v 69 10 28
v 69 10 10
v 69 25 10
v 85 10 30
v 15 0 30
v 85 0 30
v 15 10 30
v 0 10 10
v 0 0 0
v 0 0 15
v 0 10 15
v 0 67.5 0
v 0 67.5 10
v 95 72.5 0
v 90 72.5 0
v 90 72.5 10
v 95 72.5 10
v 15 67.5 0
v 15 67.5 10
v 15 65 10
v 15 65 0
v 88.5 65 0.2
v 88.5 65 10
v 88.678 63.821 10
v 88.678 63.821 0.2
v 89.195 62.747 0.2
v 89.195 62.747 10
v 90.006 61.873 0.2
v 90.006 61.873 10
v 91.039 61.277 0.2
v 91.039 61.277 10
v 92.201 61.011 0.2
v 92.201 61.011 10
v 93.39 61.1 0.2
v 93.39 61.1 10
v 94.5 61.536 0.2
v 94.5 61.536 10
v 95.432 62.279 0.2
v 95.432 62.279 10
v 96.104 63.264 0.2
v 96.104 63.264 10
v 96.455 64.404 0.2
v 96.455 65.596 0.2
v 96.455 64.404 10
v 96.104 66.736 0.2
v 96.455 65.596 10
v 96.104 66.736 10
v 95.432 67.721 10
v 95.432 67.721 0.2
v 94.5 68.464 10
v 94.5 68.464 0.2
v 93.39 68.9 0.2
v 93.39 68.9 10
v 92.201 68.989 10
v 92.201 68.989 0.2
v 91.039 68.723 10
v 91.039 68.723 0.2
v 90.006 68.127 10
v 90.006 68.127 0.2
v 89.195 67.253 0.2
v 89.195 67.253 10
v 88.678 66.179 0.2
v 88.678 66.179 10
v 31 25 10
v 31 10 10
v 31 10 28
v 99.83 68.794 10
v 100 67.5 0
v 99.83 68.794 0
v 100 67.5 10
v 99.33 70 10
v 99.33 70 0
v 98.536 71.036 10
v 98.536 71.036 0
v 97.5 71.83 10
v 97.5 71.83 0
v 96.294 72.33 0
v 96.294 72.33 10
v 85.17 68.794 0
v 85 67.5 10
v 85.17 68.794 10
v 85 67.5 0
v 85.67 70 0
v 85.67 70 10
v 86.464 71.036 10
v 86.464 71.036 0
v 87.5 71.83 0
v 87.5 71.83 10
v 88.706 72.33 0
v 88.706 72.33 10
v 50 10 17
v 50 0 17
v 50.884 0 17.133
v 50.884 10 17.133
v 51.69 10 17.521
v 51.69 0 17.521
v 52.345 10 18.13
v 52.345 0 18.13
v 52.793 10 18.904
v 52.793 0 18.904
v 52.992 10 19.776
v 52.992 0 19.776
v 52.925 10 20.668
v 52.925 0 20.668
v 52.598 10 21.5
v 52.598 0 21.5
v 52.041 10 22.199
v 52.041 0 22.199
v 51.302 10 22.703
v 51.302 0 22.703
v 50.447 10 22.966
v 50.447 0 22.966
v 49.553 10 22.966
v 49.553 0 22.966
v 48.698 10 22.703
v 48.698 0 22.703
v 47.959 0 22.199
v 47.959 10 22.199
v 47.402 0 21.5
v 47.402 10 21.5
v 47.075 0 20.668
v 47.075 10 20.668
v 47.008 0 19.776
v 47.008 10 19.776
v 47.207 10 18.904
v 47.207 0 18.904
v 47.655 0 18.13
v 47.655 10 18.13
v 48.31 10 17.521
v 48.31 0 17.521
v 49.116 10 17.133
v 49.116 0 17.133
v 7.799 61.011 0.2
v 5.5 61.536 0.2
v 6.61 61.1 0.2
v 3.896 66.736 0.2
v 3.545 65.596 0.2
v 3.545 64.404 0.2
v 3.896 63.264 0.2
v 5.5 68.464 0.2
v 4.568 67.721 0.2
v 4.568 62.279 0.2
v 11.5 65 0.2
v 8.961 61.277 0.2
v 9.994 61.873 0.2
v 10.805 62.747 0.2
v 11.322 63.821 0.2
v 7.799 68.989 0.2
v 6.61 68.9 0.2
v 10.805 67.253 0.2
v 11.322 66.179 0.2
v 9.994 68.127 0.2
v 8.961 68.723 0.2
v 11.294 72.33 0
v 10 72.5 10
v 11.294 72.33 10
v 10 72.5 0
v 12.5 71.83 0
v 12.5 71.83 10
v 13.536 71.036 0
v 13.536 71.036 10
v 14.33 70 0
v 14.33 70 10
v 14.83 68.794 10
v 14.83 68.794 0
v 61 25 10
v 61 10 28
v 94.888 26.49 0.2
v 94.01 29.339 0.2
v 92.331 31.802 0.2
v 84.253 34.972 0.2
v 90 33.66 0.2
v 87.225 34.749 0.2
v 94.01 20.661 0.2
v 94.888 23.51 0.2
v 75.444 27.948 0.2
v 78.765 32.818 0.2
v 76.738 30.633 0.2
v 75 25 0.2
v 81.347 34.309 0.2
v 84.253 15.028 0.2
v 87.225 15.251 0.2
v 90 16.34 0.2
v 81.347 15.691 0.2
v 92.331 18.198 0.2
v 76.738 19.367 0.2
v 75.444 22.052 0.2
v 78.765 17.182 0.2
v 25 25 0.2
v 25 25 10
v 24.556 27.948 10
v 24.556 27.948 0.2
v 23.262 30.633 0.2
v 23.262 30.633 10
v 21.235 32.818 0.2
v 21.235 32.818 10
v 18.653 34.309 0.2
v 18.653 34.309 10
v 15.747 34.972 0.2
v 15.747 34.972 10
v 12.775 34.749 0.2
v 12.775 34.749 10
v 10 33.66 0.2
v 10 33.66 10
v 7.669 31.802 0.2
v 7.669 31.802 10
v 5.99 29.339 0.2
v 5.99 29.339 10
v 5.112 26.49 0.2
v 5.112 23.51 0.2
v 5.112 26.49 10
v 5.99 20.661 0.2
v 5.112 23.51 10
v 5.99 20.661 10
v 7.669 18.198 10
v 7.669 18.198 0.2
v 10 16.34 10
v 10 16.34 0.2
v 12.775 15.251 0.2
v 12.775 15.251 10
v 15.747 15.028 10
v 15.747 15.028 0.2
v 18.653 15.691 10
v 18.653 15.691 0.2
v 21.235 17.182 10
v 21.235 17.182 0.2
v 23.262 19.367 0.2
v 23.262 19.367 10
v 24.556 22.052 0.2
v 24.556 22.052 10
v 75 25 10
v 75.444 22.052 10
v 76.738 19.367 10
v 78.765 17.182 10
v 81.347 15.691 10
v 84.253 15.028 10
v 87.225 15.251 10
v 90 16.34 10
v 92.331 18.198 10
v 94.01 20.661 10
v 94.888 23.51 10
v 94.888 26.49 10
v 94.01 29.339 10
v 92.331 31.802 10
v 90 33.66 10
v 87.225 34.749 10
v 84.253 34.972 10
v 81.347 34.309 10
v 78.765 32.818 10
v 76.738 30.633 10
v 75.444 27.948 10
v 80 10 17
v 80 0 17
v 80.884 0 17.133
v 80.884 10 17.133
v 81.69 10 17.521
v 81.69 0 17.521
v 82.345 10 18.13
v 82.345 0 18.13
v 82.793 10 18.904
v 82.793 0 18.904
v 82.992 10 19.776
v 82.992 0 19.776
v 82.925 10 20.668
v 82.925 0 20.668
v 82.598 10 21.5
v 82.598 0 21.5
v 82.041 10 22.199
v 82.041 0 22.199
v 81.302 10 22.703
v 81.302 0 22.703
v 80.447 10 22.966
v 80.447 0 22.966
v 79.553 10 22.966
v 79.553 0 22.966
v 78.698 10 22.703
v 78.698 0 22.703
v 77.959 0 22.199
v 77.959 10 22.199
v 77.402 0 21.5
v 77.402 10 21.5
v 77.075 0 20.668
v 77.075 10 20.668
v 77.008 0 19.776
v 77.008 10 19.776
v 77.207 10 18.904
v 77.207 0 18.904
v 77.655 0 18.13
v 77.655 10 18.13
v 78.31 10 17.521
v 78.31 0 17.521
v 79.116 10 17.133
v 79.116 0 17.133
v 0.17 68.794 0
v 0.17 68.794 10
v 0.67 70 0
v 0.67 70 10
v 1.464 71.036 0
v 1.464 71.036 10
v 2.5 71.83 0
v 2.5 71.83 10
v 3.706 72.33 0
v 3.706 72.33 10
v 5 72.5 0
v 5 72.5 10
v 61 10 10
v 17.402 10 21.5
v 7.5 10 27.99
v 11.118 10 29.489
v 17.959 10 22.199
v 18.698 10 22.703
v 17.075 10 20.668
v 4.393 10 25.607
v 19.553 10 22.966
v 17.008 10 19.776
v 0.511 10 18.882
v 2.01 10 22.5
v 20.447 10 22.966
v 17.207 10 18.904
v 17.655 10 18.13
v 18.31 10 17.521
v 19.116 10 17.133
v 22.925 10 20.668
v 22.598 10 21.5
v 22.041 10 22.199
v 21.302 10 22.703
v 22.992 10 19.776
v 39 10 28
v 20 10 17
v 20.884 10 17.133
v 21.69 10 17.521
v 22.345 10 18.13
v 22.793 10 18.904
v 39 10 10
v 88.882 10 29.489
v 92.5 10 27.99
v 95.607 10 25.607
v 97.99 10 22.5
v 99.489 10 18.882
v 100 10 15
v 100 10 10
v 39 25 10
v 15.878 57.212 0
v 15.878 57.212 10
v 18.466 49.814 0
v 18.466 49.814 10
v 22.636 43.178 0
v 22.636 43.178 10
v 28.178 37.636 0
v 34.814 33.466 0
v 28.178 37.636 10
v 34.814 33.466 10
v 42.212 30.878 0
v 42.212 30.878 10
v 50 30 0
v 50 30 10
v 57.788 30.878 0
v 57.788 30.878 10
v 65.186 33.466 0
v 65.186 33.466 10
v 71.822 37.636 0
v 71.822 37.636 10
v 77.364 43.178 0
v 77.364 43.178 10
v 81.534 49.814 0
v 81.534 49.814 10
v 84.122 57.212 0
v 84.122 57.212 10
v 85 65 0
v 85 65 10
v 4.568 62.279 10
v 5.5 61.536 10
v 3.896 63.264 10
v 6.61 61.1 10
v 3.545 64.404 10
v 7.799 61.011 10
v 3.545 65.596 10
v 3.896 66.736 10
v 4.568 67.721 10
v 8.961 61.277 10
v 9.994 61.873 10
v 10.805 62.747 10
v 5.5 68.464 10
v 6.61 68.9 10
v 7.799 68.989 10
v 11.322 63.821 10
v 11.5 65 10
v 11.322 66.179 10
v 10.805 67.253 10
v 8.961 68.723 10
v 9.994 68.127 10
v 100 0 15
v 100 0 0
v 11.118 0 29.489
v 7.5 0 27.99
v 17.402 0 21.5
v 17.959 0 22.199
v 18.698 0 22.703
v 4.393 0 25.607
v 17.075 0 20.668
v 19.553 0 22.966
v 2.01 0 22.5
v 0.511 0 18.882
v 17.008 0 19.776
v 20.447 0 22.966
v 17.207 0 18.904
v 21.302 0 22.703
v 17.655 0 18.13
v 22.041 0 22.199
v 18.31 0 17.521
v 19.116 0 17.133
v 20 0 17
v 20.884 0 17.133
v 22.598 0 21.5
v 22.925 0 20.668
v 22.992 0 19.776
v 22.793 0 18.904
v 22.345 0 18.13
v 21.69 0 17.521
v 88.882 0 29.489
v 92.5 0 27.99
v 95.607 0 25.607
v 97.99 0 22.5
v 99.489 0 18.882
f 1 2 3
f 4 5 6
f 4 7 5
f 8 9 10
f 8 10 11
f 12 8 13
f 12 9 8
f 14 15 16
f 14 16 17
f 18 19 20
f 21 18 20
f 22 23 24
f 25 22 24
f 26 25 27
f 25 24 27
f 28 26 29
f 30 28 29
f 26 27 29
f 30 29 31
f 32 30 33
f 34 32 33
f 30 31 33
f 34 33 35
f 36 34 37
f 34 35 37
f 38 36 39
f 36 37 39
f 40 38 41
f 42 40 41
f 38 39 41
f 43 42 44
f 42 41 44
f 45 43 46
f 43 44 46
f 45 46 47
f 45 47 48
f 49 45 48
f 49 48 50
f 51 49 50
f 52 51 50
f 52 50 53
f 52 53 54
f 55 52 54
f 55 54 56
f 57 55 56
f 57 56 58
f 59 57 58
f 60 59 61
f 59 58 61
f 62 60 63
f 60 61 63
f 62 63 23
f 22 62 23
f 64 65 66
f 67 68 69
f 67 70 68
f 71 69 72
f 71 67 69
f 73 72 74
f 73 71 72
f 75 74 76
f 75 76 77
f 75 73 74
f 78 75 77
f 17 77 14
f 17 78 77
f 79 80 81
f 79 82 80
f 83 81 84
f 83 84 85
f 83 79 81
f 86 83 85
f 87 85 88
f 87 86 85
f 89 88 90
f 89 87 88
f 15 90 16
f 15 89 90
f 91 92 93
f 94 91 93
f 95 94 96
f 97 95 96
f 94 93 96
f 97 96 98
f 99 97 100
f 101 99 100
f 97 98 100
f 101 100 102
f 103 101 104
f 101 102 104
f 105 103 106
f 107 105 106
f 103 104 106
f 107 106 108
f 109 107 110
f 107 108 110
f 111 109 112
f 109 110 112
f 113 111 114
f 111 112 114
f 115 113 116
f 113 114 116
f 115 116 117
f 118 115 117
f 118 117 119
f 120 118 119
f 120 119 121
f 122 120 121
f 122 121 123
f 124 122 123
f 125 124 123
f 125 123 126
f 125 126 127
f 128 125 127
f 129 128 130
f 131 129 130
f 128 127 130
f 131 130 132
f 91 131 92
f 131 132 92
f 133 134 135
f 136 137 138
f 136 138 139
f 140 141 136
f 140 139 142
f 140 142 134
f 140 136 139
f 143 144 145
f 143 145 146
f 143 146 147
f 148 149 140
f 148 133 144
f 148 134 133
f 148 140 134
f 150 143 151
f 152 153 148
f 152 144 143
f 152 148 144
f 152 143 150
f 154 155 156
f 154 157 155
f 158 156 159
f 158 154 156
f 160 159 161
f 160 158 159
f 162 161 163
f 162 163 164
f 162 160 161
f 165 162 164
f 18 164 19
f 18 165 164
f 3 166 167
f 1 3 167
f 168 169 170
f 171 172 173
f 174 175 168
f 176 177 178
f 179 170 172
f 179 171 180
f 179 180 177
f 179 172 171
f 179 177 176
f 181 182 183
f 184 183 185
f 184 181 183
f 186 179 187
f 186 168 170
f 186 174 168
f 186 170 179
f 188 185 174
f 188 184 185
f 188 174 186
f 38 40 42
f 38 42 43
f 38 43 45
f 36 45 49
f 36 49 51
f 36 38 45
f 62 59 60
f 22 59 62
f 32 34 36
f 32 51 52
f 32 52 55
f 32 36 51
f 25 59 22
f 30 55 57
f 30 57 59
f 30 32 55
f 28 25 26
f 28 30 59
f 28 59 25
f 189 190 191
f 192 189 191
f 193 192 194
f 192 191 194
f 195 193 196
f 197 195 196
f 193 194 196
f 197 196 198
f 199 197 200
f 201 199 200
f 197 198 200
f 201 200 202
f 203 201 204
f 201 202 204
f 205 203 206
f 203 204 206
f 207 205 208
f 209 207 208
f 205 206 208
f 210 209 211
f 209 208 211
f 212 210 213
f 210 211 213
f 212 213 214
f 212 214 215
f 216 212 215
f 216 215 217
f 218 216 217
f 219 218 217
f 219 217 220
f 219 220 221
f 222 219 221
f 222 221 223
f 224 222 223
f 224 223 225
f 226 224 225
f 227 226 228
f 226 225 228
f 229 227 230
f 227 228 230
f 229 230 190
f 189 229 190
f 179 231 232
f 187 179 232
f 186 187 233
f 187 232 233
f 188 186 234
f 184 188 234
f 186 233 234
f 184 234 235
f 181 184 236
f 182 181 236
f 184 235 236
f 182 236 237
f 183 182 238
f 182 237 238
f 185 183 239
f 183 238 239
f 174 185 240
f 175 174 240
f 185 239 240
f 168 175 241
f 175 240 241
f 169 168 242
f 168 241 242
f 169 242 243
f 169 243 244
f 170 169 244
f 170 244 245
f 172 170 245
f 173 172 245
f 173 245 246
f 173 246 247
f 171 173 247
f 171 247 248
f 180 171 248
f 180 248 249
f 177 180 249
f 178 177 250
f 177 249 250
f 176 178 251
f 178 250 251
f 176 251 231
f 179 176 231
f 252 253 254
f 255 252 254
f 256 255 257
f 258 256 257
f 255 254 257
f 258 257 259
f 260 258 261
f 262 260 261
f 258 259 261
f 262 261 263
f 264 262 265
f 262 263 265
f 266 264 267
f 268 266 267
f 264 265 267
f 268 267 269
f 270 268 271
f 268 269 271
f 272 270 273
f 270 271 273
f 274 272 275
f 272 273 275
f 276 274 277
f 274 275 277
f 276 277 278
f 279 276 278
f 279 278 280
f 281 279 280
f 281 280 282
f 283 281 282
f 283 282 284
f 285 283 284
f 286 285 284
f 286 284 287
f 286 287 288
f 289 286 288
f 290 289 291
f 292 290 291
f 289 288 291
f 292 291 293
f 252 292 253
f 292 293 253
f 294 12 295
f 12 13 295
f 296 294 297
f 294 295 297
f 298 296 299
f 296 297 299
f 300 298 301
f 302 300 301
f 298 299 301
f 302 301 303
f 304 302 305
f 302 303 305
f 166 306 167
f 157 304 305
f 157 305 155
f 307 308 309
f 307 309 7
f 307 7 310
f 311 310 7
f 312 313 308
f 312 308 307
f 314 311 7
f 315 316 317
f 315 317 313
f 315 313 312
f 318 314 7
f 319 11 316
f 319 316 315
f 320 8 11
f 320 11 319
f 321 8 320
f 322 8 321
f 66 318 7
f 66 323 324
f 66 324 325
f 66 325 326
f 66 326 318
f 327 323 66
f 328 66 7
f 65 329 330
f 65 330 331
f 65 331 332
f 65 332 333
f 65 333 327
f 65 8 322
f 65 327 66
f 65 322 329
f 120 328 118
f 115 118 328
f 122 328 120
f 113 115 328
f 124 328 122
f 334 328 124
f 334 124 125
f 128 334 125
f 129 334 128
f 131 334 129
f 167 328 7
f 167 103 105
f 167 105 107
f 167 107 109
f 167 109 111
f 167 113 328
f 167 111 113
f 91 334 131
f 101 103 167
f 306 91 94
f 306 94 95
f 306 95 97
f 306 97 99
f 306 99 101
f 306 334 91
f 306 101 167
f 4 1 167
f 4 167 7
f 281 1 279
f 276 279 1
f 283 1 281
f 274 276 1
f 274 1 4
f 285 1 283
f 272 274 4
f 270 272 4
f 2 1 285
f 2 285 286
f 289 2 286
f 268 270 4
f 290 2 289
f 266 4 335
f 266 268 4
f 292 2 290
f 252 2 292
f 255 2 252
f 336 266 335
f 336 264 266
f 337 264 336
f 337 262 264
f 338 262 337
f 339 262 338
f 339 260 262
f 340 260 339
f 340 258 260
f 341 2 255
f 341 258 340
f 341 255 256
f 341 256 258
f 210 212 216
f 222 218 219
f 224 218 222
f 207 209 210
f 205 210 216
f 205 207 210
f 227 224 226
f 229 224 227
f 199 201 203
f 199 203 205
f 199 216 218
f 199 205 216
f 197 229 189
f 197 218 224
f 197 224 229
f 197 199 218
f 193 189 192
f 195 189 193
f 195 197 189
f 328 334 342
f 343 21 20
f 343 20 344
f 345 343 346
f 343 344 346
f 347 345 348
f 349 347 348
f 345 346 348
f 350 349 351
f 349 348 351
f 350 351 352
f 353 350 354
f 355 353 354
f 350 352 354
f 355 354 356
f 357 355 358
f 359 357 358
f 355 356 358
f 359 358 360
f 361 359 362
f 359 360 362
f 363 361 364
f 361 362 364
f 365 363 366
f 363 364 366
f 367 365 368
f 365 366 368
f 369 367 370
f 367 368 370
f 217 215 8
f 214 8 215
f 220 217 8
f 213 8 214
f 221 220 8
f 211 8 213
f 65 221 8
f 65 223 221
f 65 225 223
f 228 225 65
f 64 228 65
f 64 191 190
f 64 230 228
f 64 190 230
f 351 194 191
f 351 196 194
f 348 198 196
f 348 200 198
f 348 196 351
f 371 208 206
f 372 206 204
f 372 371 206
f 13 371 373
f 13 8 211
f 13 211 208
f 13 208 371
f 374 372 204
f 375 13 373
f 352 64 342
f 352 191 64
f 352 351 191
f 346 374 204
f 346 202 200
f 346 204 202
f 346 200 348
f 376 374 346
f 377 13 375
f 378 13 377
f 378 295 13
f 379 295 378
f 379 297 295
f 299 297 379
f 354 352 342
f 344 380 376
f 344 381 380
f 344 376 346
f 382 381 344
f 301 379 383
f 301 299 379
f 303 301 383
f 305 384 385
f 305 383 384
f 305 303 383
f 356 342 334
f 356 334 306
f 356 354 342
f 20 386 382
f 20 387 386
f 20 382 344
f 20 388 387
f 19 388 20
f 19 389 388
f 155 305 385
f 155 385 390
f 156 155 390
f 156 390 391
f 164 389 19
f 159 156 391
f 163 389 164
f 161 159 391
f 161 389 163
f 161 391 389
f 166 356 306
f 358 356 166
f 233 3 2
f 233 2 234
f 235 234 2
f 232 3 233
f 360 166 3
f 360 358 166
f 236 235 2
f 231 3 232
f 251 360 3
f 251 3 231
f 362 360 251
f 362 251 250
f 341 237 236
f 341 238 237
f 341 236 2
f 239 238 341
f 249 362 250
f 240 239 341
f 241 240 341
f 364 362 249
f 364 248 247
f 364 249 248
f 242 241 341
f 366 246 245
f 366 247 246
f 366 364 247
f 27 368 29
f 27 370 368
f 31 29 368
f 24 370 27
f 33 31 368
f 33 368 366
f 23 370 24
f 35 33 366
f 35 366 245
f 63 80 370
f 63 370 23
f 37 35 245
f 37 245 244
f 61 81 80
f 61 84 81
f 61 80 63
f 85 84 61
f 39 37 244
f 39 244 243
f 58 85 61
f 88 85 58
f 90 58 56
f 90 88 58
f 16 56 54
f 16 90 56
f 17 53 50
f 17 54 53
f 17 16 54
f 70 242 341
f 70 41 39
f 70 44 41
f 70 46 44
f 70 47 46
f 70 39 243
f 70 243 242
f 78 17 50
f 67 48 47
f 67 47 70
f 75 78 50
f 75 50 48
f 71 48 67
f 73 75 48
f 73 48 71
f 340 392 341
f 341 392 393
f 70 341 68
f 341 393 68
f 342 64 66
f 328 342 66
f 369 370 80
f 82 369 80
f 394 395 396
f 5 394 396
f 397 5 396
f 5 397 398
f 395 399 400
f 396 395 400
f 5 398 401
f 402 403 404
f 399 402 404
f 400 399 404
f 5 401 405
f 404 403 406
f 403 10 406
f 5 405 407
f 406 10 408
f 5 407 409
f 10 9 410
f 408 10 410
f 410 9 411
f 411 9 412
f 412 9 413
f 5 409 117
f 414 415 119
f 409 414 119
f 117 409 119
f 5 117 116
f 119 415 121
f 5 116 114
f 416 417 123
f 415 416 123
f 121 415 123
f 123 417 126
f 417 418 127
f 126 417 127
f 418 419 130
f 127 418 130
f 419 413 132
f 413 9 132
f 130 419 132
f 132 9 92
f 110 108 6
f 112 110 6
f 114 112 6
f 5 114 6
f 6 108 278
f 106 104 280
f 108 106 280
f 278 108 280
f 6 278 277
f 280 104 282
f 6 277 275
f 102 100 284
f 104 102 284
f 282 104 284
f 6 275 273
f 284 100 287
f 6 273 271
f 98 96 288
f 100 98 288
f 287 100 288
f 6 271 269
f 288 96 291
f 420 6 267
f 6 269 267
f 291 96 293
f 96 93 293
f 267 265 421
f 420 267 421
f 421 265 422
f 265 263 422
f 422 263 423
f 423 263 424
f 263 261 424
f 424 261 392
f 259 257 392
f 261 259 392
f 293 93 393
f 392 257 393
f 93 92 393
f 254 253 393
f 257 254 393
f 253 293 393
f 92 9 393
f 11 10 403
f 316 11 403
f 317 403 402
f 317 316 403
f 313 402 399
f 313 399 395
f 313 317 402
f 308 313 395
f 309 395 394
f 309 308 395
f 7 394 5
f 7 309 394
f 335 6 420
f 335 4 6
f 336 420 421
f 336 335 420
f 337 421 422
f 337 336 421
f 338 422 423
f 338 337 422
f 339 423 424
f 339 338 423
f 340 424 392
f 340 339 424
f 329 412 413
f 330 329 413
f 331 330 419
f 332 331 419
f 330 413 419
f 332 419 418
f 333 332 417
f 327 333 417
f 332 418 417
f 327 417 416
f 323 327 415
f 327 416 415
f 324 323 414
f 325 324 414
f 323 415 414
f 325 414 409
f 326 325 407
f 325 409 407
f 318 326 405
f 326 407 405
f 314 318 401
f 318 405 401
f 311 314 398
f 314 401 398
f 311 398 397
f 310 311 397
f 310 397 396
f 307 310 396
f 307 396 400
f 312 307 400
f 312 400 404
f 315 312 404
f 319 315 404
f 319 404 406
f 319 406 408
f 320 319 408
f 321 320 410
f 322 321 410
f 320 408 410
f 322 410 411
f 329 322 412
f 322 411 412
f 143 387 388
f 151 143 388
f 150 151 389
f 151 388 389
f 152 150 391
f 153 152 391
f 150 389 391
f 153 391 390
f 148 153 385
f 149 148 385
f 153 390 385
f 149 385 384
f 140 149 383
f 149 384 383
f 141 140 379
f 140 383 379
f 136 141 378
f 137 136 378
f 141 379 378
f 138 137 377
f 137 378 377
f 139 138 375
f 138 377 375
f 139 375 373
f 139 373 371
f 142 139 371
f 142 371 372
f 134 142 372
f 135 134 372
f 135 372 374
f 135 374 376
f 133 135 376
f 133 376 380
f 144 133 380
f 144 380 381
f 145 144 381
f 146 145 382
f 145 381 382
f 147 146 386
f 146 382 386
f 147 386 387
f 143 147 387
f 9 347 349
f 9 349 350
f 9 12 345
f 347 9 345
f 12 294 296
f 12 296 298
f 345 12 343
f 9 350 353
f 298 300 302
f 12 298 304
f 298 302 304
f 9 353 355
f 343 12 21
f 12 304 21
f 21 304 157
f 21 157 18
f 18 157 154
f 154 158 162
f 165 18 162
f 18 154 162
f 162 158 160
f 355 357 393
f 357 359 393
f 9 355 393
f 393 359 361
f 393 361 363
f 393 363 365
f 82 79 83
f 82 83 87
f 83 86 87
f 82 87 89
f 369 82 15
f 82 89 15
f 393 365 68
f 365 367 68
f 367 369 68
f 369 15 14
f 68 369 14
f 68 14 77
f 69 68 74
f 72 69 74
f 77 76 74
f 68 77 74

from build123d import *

# Parameters (mm, degrees)
SKETCH1_W           = 100
SKETCH1_H           = 72.5
BOSS_EXTRUDE1_DEPTH = 10
CUT_EXTRUDE1_DEPTH  = 10
SKETCH3_W           = 100
SKETCH3_H           = 10
FEET_DEPTH          = 20
SKETCH4_R           = 3
FEET_HOLE_DEPTH     = 10
SKETCH6_W           = 8
SKETCH6_H           = 15
BOSS_EXTRUDE2_DEPTH = 18
CUT_EXTRUDE2_DEPTH  = 105.485644947
SKETCH5_R           = 4
SKETCH5_R_2         = 10
CUT_EXTRUDE3_DEPTH  = 9.8
FILLET1_R           = 5
FILLET2_R           = 15


with BuildPart() as part:
    # Sketch1 → Boss-Extrude1 (new body)
    with BuildSketch(Plane.XY):
        with Locations((50, 36.25)):
            Rectangle(SKETCH1_W, SKETCH1_H)
    extrude(amount=BOSS_EXTRUDE1_DEPTH)

    # Sketch2 → Cut-Extrude1 (cut)
    with BuildSketch(Plane.XY.offset(10)):
        with BuildLine():
            Line((85, 65), (85, 72.5))
            Line((85, 72.5), (15, 72.5))
            Line((15, 72.5), (15, 65))
            ThreePointArc((15, 65), (50, 30), (85, 65))
        make_face()
    extrude(amount=-CUT_EXTRUDE1_DEPTH, mode=Mode.SUBTRACT)

    # Sketch3 → feet (add)
    with BuildSketch(Plane.XY.offset(10)):
        with Locations((50, 5)):
            Rectangle(SKETCH3_W, SKETCH3_H)
    extrude(amount=FEET_DEPTH)

    # Sketch4 → feet-hole (cut)
    with BuildSketch(Plane.XZ):
        with Locations(Location((20, 20, 0), (0, 0, 270))):
            Circle(SKETCH4_R)
        with Locations(Location((80, 20, 0), (0, 0, 270))):
            Circle(SKETCH4_R)
        with Locations(Location((50, 20, 0), (0, 0, 270))):
            Circle(SKETCH4_R)
    extrude(amount=-FEET_HOLE_DEPTH, mode=Mode.SUBTRACT)

    # Sketch6 → Boss-Extrude2 (add)
    with BuildSketch(Plane.XY.offset(10)):
        with Locations((35, 17.5)):
            Rectangle(SKETCH6_W, SKETCH6_H)
        with Locations((65, 17.5)):
            Rectangle(SKETCH6_W, SKETCH6_H)
    extrude(amount=BOSS_EXTRUDE2_DEPTH)

    # Sketch7 → Cut-Extrude2 (cut, through all)
    with BuildSketch(Plane.ZY.offset(-31)):
        Polygon((10, 25), (28, 10), (28, 25), align=None)
    extrude(amount=-CUT_EXTRUDE2_DEPTH, mode=Mode.SUBTRACT)

    # Sketch5 → Cut-Extrude3 (cut)
    with BuildSketch(Plane.XY.offset(10)):
        with Locations((7.5, 65)):
            Circle(SKETCH5_R)
        with Locations(Location((92.5, 65, 0), (0, 0, 180))):
            Circle(SKETCH5_R)
        with Locations((15, 25)):
            Circle(SKETCH5_R_2)
        with Locations(Location((85, 25, 0), (0, 0, 180))):
            Circle(SKETCH5_R_2)
    extrude(amount=-CUT_EXTRUDE3_DEPTH, mode=Mode.SUBTRACT)

    # Fillet1
    fillet1_edges = [part.edges().sort_by_distance(p)[0] for p in [
        (0, 72.5, 5),
        (15, 72.5, 5),
        (85, 72.5, 5),
        (100, 72.5, 5),
    ]]
    fillet(fillet1_edges, radius=FILLET1_R)

    # Fillet2
    fillet2_edges = [part.edges().sort_by_distance(p)[0] for p in [
        (0, 5, 30),
        (100, 5, 30),
    ]]
    fillet(fillet2_edges, radius=FILLET2_R)


solid = part.part
